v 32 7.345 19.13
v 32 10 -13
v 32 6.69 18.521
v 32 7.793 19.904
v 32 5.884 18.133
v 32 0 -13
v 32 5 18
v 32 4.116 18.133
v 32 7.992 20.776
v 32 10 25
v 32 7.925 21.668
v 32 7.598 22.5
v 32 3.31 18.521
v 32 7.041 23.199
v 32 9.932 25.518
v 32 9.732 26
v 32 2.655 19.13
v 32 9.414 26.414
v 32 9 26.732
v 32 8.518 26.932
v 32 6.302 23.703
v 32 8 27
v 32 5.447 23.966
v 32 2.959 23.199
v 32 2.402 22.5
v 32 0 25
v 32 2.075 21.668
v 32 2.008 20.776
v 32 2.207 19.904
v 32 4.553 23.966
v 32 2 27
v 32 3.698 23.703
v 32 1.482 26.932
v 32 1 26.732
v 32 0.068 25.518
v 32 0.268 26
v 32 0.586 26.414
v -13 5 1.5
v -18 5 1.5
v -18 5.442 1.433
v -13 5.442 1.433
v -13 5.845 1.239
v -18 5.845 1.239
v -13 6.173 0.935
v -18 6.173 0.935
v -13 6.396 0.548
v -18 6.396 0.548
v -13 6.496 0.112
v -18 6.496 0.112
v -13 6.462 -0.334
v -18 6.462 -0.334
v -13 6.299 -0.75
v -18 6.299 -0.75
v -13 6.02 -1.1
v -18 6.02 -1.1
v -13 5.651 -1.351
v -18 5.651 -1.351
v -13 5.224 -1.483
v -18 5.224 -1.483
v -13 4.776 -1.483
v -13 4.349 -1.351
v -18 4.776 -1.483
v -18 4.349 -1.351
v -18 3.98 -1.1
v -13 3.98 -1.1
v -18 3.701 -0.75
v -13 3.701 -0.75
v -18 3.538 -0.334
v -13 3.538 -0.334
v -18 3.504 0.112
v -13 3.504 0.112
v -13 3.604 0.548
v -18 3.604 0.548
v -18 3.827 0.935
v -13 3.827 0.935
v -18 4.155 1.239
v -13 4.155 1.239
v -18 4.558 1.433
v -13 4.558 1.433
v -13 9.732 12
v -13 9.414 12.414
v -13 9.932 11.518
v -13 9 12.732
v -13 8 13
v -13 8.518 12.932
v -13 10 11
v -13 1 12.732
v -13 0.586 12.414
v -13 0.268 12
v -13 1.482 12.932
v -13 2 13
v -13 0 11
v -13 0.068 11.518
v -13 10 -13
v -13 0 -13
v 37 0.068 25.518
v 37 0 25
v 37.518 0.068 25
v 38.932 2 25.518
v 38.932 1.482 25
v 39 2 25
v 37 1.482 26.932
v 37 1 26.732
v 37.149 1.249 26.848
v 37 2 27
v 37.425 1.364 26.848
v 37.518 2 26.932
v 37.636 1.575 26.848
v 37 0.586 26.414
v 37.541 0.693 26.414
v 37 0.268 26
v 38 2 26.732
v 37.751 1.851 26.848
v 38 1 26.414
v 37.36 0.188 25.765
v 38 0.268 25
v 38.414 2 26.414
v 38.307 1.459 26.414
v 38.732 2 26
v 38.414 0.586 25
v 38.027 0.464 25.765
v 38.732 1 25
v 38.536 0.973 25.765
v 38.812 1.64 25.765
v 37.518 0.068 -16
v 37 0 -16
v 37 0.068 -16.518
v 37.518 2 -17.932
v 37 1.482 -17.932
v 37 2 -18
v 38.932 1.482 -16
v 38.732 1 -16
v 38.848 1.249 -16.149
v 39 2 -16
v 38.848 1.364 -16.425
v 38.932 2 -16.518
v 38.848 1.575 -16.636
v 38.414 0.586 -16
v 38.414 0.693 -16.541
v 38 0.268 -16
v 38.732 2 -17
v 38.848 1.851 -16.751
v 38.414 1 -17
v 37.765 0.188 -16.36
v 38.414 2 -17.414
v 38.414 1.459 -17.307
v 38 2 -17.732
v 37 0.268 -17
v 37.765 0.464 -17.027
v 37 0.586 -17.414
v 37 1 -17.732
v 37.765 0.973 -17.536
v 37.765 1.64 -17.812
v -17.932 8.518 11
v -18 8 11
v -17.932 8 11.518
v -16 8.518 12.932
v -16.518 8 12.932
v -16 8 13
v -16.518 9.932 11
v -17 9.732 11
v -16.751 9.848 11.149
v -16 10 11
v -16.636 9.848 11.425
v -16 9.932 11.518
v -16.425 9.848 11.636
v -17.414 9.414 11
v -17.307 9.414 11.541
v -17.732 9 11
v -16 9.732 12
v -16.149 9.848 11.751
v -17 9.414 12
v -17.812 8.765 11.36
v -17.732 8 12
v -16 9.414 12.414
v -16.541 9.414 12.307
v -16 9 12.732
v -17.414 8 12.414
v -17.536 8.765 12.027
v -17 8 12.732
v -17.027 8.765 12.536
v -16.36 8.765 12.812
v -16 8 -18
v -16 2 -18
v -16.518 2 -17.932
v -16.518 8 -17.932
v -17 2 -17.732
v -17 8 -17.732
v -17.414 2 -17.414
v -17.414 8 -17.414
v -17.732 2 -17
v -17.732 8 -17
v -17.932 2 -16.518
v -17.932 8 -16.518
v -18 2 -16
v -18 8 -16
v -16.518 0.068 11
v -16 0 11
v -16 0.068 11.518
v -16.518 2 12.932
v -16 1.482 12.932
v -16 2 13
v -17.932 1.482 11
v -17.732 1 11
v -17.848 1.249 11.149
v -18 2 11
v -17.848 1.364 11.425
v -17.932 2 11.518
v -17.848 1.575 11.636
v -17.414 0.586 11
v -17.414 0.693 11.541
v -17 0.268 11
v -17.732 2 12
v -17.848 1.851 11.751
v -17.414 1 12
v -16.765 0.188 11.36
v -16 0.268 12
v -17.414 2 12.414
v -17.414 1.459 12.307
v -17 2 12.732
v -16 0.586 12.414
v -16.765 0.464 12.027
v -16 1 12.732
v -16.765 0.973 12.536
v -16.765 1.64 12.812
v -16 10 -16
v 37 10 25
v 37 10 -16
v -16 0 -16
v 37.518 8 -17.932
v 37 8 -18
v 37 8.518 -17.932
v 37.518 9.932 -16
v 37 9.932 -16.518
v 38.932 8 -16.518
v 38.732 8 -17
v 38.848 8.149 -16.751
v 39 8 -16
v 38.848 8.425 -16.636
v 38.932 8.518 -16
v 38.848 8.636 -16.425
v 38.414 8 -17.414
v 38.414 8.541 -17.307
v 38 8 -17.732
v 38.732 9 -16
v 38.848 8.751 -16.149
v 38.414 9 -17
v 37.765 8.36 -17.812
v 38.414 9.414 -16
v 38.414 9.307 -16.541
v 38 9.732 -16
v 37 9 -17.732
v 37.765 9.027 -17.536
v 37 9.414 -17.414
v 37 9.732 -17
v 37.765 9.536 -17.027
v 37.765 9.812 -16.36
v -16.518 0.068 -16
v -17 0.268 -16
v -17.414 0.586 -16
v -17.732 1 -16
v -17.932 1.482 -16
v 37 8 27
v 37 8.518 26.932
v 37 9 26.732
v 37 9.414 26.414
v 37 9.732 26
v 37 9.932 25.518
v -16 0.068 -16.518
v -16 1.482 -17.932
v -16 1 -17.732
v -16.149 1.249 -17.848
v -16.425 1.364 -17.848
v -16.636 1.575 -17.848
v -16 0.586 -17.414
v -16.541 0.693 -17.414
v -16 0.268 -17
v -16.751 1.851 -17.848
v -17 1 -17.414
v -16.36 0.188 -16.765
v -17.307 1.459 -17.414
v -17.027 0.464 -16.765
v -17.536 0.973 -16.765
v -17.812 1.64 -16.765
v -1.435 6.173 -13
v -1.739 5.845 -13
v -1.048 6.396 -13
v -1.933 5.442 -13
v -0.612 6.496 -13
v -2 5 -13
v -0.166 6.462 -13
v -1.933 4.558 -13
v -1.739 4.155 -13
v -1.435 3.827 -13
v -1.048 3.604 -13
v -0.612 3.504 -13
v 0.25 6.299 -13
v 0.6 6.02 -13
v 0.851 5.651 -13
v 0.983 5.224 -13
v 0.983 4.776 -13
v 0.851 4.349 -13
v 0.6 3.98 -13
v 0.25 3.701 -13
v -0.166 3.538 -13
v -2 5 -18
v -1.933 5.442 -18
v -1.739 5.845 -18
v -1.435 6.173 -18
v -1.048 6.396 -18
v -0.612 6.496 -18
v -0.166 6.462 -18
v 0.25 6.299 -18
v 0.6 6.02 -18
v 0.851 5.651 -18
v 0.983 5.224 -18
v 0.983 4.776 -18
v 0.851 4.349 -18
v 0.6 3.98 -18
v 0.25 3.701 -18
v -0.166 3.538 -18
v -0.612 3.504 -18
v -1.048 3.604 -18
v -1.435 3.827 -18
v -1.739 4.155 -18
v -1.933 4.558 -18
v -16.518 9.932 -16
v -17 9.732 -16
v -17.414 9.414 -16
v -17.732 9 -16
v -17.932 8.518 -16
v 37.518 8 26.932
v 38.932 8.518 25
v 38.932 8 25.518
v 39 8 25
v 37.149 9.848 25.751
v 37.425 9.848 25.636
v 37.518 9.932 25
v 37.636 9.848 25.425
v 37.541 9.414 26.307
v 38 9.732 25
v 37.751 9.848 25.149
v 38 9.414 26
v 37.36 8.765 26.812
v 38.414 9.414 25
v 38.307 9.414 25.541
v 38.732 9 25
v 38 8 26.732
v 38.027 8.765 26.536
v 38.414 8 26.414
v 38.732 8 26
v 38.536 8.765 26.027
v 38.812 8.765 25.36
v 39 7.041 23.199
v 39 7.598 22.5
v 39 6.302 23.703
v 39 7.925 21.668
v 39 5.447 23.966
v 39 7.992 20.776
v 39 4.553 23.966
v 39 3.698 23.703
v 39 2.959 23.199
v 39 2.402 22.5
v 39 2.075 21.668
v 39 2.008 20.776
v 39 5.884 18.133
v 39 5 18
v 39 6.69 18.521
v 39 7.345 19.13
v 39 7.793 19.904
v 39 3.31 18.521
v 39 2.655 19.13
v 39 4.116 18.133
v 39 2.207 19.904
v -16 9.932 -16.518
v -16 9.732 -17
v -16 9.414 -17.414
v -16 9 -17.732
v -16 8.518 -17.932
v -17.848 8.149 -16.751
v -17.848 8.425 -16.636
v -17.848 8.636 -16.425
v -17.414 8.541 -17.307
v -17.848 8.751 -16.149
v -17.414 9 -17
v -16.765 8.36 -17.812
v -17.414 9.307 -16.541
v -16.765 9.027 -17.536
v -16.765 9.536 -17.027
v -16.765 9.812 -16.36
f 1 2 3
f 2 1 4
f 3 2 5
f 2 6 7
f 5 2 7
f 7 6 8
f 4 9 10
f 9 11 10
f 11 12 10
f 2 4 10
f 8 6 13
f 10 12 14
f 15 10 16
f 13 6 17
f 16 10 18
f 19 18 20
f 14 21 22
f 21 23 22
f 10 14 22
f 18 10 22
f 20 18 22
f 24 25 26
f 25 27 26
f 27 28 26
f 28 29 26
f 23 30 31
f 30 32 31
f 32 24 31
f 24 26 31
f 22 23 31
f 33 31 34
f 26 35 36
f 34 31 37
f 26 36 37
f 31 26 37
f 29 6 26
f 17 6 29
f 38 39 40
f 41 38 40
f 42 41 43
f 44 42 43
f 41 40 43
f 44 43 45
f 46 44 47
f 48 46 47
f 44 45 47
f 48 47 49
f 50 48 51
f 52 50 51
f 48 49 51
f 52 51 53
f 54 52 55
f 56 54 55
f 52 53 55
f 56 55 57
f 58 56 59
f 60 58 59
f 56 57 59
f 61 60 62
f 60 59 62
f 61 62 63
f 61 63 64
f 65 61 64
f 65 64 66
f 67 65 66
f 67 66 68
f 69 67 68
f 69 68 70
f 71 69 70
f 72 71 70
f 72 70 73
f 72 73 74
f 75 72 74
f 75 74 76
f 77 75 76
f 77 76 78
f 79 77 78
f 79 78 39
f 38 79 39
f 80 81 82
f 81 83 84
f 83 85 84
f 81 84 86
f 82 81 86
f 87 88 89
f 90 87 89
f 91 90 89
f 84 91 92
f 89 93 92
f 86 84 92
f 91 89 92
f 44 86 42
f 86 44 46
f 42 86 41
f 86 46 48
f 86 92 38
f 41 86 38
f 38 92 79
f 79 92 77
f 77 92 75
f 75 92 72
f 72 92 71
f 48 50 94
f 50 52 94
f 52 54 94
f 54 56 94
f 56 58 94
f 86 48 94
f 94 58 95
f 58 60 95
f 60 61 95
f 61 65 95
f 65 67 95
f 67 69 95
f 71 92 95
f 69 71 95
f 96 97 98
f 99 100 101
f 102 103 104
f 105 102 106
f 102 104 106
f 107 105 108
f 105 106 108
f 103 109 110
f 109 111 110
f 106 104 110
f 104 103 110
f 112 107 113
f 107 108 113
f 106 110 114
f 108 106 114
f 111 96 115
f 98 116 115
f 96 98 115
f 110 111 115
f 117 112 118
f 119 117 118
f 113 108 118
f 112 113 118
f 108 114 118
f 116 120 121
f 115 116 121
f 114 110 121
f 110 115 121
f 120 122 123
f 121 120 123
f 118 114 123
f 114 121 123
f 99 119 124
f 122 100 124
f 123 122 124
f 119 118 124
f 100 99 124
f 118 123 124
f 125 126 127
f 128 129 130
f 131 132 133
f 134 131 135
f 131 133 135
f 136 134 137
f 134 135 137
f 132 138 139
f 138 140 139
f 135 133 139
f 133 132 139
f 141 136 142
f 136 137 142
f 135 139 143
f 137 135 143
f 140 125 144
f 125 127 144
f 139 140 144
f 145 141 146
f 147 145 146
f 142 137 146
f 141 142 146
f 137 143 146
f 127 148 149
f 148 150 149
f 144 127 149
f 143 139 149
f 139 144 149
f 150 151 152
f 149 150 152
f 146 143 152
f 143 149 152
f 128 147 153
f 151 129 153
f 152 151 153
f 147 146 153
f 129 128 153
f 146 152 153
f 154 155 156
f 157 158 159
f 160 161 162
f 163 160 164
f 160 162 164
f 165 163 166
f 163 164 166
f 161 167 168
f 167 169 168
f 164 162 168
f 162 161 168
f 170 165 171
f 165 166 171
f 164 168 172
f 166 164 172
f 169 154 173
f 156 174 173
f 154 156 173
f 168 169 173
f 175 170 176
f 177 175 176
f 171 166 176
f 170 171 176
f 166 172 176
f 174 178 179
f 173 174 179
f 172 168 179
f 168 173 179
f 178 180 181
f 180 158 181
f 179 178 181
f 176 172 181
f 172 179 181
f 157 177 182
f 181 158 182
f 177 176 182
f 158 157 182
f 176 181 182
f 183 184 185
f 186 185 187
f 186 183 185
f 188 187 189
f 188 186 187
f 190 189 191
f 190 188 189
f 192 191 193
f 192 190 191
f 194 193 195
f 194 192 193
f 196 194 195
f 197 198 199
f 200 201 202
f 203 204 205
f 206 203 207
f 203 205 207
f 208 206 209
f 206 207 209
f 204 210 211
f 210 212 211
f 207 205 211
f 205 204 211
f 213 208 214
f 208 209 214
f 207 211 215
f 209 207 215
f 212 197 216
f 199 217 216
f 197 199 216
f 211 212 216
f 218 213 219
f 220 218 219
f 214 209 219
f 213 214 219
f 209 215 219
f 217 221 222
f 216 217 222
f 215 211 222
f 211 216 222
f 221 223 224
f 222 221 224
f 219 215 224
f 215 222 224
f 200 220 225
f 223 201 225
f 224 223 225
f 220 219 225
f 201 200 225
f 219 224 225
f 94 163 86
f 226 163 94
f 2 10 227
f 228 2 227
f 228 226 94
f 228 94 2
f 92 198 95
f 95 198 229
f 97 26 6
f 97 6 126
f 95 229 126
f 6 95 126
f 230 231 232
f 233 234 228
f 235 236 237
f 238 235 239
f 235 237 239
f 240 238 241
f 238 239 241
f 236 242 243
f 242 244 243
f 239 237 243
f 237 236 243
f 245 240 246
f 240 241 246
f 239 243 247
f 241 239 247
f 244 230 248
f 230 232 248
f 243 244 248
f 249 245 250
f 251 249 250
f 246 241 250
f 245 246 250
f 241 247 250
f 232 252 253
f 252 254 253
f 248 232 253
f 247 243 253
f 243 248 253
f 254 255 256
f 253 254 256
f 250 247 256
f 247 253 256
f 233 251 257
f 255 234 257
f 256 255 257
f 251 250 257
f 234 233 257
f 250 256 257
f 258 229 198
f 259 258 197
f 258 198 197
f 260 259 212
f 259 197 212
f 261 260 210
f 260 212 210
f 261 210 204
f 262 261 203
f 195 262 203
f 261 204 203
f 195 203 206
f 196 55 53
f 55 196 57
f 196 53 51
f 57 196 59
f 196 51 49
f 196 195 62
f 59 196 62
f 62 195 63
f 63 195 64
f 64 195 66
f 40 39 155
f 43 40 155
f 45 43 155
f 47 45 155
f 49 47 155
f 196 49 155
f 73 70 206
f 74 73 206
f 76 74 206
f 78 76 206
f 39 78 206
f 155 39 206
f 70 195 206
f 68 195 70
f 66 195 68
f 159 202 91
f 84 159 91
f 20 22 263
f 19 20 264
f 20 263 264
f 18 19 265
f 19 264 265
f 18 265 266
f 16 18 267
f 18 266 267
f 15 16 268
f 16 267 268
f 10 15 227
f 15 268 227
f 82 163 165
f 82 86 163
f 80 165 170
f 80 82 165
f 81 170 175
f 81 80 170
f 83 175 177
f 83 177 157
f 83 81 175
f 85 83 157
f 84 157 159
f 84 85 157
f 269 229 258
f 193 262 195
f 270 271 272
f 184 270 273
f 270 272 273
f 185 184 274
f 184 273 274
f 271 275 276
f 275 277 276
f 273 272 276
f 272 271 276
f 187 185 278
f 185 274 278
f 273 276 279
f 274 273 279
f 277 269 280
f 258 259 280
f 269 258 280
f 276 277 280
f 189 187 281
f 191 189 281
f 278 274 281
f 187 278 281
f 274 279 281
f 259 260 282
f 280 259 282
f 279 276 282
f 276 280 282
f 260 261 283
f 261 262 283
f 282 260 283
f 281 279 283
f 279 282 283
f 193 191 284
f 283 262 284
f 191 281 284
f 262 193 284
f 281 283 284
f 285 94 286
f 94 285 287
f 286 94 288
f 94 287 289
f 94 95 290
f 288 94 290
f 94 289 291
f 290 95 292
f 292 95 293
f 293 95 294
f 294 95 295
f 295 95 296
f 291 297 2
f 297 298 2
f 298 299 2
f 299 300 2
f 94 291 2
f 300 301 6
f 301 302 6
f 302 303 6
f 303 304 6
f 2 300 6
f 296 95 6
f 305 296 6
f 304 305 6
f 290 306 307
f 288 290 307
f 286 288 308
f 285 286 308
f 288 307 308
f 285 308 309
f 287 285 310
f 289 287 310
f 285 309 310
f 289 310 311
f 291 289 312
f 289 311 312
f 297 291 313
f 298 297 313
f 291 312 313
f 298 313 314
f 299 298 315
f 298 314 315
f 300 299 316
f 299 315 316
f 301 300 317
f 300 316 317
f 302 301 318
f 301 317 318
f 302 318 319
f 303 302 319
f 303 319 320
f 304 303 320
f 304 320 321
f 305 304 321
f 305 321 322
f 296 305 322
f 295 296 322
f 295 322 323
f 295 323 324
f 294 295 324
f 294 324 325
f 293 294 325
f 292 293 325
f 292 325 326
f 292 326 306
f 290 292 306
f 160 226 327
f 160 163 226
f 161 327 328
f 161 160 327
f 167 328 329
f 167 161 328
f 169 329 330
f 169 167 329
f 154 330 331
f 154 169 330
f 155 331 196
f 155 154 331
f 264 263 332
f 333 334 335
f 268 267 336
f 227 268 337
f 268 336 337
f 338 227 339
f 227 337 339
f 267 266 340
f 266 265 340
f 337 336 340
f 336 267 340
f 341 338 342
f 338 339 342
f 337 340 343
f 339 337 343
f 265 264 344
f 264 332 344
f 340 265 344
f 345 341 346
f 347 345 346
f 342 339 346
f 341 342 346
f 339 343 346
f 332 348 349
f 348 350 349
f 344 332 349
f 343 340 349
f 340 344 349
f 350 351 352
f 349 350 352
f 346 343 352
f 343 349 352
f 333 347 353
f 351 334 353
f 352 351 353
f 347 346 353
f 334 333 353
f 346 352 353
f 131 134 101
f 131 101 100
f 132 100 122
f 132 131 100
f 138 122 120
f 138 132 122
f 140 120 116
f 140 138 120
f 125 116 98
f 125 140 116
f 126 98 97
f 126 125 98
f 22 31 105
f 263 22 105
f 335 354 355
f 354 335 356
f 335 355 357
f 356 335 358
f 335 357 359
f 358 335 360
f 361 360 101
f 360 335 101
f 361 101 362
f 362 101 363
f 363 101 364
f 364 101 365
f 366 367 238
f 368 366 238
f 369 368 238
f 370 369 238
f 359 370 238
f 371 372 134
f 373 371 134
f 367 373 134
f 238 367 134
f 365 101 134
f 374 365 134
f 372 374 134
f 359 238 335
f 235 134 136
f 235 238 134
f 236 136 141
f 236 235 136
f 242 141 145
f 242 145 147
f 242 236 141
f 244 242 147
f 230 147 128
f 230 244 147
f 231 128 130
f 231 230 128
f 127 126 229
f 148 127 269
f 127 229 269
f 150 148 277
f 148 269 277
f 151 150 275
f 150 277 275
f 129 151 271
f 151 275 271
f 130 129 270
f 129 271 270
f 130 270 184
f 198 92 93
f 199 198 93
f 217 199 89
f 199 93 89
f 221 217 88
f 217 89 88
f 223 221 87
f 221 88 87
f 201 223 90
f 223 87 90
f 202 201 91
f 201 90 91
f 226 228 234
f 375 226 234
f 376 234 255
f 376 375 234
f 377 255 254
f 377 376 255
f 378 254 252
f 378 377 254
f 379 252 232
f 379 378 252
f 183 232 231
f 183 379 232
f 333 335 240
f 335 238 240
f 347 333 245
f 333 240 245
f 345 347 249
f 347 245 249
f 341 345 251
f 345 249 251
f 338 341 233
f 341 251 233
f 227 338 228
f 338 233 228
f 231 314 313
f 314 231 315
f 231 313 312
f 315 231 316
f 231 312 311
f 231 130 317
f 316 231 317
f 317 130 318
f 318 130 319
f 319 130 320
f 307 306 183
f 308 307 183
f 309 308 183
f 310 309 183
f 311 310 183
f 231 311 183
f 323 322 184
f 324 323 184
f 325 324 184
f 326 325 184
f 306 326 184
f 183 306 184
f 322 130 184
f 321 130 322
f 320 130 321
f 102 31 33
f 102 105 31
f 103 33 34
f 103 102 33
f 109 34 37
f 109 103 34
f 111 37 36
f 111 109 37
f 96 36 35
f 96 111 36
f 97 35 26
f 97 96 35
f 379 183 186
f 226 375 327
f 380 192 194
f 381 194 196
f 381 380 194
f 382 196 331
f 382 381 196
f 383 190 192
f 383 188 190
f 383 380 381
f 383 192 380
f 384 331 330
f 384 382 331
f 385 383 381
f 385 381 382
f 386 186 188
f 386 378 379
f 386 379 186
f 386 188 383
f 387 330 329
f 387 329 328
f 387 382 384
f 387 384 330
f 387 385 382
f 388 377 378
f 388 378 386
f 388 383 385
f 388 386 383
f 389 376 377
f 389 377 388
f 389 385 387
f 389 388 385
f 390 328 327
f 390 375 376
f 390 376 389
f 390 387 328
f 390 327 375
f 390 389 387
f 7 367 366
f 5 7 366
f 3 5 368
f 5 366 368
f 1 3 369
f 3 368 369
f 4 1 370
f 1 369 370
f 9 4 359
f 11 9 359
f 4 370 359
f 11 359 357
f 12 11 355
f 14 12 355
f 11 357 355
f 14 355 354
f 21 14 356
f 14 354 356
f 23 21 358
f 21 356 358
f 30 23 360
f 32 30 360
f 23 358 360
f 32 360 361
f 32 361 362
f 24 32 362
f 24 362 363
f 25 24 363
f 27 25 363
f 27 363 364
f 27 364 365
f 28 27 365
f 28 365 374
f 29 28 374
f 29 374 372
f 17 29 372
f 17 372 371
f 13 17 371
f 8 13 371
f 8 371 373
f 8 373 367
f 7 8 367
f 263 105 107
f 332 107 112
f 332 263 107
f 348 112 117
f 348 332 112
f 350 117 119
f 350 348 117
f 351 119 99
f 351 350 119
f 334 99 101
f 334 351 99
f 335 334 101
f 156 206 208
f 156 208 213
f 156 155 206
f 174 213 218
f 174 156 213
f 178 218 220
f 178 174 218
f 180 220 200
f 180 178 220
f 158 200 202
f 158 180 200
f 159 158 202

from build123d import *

# Parameters (mm, degrees)
BOSS_EXTRUDE1_DEPTH = 10
SKETCH3_R           = 2.9999999999999973
CUT_EXTRUDE1_DEPTH  = 10
FILLET3_R           = 2
SKETCH4_R           = 1.4999999999999998
CUT_EXTRUDE2_DEPTH  = 10
SKETCH5_R           = 1.5000000000000002
CUT_EXTRUDE3_DEPTH  = 10


with BuildPart() as part:
    # Sketch2 → Boss-Extrude1 (new body)
    with BuildSketch(Plane(origin=(0, 0, 0), x_dir=(1, 0, 0), z_dir=(0, 1, 0))):
        Polygon((32.000000000000014, -27.000000000000004), (39.000000000000014, -27.000000000000004), (39.00000000000001, 18.000000000000004), (-18, 18), (-18, -13), (-12.999999999999998, -13), (-12.999999999999998, 13), (13.000000000000002, 13), (32, 13), align=None)
    extrude(amount=BOSS_EXTRUDE1_DEPTH)

    # Sketch3 → Cut-Extrude1 (cut)
    with BuildSketch(Plane(origin=(39.00000000000001, 0, -6.01e-15), x_dir=(0, 0, -1), z_dir=(1, 0, 0))):
        with Locations((-21, 5)):
            Circle(SKETCH3_R)
    extrude(amount=-CUT_EXTRUDE1_DEPTH, mode=Mode.SUBTRACT)

    # Fillet3
    fillet3_edges = [part.edges().sort_by_distance(p)[0] for p in [
        (-15.5, 0, 13),
        (-18, 0, -2.5),
        (10.500000000000004, 0, -18),
        (39.000000000000014, 0, 4.5),
        (35.500000000000014, 0, 27.000000000000004),
        (10.500000000000004, 10, -18),
        (-18, 5, 13),
        (-18, 5, -18),
        (39.00000000000001, 5, -18.000000000000004),
        (39.000000000000014, 5, 27.000000000000004),
        (-18, 10, -2.5),
        (-15.5, 10, 13),
        (35.500000000000014, 10, 27.000000000000004),
        (39.000000000000014, 10, 4.5),
    ]]
    fillet(fillet3_edges, radius=FILLET3_R)

    # Sketch4 → Cut-Extrude2 (cut)
    with BuildSketch(Plane(origin=(-1.1e-15, 0, -18), x_dir=(-1, 0, 6e-17), z_dir=(-6e-17, 0, -1))):
        with Locations((0.5000000000000004, 5)):
            Circle(SKETCH4_R)
    extrude(amount=-CUT_EXTRUDE2_DEPTH, mode=Mode.SUBTRACT)

    # Sketch5 → Cut-Extrude3 (cut)
    with BuildSketch(Plane.ZY.offset(18)):
        with Locations((3.47e-15, 5)):
            Circle(SKETCH5_R)
    extrude(amount=-CUT_EXTRUDE3_DEPTH, mode=Mode.SUBTRACT)


solid = part.part
